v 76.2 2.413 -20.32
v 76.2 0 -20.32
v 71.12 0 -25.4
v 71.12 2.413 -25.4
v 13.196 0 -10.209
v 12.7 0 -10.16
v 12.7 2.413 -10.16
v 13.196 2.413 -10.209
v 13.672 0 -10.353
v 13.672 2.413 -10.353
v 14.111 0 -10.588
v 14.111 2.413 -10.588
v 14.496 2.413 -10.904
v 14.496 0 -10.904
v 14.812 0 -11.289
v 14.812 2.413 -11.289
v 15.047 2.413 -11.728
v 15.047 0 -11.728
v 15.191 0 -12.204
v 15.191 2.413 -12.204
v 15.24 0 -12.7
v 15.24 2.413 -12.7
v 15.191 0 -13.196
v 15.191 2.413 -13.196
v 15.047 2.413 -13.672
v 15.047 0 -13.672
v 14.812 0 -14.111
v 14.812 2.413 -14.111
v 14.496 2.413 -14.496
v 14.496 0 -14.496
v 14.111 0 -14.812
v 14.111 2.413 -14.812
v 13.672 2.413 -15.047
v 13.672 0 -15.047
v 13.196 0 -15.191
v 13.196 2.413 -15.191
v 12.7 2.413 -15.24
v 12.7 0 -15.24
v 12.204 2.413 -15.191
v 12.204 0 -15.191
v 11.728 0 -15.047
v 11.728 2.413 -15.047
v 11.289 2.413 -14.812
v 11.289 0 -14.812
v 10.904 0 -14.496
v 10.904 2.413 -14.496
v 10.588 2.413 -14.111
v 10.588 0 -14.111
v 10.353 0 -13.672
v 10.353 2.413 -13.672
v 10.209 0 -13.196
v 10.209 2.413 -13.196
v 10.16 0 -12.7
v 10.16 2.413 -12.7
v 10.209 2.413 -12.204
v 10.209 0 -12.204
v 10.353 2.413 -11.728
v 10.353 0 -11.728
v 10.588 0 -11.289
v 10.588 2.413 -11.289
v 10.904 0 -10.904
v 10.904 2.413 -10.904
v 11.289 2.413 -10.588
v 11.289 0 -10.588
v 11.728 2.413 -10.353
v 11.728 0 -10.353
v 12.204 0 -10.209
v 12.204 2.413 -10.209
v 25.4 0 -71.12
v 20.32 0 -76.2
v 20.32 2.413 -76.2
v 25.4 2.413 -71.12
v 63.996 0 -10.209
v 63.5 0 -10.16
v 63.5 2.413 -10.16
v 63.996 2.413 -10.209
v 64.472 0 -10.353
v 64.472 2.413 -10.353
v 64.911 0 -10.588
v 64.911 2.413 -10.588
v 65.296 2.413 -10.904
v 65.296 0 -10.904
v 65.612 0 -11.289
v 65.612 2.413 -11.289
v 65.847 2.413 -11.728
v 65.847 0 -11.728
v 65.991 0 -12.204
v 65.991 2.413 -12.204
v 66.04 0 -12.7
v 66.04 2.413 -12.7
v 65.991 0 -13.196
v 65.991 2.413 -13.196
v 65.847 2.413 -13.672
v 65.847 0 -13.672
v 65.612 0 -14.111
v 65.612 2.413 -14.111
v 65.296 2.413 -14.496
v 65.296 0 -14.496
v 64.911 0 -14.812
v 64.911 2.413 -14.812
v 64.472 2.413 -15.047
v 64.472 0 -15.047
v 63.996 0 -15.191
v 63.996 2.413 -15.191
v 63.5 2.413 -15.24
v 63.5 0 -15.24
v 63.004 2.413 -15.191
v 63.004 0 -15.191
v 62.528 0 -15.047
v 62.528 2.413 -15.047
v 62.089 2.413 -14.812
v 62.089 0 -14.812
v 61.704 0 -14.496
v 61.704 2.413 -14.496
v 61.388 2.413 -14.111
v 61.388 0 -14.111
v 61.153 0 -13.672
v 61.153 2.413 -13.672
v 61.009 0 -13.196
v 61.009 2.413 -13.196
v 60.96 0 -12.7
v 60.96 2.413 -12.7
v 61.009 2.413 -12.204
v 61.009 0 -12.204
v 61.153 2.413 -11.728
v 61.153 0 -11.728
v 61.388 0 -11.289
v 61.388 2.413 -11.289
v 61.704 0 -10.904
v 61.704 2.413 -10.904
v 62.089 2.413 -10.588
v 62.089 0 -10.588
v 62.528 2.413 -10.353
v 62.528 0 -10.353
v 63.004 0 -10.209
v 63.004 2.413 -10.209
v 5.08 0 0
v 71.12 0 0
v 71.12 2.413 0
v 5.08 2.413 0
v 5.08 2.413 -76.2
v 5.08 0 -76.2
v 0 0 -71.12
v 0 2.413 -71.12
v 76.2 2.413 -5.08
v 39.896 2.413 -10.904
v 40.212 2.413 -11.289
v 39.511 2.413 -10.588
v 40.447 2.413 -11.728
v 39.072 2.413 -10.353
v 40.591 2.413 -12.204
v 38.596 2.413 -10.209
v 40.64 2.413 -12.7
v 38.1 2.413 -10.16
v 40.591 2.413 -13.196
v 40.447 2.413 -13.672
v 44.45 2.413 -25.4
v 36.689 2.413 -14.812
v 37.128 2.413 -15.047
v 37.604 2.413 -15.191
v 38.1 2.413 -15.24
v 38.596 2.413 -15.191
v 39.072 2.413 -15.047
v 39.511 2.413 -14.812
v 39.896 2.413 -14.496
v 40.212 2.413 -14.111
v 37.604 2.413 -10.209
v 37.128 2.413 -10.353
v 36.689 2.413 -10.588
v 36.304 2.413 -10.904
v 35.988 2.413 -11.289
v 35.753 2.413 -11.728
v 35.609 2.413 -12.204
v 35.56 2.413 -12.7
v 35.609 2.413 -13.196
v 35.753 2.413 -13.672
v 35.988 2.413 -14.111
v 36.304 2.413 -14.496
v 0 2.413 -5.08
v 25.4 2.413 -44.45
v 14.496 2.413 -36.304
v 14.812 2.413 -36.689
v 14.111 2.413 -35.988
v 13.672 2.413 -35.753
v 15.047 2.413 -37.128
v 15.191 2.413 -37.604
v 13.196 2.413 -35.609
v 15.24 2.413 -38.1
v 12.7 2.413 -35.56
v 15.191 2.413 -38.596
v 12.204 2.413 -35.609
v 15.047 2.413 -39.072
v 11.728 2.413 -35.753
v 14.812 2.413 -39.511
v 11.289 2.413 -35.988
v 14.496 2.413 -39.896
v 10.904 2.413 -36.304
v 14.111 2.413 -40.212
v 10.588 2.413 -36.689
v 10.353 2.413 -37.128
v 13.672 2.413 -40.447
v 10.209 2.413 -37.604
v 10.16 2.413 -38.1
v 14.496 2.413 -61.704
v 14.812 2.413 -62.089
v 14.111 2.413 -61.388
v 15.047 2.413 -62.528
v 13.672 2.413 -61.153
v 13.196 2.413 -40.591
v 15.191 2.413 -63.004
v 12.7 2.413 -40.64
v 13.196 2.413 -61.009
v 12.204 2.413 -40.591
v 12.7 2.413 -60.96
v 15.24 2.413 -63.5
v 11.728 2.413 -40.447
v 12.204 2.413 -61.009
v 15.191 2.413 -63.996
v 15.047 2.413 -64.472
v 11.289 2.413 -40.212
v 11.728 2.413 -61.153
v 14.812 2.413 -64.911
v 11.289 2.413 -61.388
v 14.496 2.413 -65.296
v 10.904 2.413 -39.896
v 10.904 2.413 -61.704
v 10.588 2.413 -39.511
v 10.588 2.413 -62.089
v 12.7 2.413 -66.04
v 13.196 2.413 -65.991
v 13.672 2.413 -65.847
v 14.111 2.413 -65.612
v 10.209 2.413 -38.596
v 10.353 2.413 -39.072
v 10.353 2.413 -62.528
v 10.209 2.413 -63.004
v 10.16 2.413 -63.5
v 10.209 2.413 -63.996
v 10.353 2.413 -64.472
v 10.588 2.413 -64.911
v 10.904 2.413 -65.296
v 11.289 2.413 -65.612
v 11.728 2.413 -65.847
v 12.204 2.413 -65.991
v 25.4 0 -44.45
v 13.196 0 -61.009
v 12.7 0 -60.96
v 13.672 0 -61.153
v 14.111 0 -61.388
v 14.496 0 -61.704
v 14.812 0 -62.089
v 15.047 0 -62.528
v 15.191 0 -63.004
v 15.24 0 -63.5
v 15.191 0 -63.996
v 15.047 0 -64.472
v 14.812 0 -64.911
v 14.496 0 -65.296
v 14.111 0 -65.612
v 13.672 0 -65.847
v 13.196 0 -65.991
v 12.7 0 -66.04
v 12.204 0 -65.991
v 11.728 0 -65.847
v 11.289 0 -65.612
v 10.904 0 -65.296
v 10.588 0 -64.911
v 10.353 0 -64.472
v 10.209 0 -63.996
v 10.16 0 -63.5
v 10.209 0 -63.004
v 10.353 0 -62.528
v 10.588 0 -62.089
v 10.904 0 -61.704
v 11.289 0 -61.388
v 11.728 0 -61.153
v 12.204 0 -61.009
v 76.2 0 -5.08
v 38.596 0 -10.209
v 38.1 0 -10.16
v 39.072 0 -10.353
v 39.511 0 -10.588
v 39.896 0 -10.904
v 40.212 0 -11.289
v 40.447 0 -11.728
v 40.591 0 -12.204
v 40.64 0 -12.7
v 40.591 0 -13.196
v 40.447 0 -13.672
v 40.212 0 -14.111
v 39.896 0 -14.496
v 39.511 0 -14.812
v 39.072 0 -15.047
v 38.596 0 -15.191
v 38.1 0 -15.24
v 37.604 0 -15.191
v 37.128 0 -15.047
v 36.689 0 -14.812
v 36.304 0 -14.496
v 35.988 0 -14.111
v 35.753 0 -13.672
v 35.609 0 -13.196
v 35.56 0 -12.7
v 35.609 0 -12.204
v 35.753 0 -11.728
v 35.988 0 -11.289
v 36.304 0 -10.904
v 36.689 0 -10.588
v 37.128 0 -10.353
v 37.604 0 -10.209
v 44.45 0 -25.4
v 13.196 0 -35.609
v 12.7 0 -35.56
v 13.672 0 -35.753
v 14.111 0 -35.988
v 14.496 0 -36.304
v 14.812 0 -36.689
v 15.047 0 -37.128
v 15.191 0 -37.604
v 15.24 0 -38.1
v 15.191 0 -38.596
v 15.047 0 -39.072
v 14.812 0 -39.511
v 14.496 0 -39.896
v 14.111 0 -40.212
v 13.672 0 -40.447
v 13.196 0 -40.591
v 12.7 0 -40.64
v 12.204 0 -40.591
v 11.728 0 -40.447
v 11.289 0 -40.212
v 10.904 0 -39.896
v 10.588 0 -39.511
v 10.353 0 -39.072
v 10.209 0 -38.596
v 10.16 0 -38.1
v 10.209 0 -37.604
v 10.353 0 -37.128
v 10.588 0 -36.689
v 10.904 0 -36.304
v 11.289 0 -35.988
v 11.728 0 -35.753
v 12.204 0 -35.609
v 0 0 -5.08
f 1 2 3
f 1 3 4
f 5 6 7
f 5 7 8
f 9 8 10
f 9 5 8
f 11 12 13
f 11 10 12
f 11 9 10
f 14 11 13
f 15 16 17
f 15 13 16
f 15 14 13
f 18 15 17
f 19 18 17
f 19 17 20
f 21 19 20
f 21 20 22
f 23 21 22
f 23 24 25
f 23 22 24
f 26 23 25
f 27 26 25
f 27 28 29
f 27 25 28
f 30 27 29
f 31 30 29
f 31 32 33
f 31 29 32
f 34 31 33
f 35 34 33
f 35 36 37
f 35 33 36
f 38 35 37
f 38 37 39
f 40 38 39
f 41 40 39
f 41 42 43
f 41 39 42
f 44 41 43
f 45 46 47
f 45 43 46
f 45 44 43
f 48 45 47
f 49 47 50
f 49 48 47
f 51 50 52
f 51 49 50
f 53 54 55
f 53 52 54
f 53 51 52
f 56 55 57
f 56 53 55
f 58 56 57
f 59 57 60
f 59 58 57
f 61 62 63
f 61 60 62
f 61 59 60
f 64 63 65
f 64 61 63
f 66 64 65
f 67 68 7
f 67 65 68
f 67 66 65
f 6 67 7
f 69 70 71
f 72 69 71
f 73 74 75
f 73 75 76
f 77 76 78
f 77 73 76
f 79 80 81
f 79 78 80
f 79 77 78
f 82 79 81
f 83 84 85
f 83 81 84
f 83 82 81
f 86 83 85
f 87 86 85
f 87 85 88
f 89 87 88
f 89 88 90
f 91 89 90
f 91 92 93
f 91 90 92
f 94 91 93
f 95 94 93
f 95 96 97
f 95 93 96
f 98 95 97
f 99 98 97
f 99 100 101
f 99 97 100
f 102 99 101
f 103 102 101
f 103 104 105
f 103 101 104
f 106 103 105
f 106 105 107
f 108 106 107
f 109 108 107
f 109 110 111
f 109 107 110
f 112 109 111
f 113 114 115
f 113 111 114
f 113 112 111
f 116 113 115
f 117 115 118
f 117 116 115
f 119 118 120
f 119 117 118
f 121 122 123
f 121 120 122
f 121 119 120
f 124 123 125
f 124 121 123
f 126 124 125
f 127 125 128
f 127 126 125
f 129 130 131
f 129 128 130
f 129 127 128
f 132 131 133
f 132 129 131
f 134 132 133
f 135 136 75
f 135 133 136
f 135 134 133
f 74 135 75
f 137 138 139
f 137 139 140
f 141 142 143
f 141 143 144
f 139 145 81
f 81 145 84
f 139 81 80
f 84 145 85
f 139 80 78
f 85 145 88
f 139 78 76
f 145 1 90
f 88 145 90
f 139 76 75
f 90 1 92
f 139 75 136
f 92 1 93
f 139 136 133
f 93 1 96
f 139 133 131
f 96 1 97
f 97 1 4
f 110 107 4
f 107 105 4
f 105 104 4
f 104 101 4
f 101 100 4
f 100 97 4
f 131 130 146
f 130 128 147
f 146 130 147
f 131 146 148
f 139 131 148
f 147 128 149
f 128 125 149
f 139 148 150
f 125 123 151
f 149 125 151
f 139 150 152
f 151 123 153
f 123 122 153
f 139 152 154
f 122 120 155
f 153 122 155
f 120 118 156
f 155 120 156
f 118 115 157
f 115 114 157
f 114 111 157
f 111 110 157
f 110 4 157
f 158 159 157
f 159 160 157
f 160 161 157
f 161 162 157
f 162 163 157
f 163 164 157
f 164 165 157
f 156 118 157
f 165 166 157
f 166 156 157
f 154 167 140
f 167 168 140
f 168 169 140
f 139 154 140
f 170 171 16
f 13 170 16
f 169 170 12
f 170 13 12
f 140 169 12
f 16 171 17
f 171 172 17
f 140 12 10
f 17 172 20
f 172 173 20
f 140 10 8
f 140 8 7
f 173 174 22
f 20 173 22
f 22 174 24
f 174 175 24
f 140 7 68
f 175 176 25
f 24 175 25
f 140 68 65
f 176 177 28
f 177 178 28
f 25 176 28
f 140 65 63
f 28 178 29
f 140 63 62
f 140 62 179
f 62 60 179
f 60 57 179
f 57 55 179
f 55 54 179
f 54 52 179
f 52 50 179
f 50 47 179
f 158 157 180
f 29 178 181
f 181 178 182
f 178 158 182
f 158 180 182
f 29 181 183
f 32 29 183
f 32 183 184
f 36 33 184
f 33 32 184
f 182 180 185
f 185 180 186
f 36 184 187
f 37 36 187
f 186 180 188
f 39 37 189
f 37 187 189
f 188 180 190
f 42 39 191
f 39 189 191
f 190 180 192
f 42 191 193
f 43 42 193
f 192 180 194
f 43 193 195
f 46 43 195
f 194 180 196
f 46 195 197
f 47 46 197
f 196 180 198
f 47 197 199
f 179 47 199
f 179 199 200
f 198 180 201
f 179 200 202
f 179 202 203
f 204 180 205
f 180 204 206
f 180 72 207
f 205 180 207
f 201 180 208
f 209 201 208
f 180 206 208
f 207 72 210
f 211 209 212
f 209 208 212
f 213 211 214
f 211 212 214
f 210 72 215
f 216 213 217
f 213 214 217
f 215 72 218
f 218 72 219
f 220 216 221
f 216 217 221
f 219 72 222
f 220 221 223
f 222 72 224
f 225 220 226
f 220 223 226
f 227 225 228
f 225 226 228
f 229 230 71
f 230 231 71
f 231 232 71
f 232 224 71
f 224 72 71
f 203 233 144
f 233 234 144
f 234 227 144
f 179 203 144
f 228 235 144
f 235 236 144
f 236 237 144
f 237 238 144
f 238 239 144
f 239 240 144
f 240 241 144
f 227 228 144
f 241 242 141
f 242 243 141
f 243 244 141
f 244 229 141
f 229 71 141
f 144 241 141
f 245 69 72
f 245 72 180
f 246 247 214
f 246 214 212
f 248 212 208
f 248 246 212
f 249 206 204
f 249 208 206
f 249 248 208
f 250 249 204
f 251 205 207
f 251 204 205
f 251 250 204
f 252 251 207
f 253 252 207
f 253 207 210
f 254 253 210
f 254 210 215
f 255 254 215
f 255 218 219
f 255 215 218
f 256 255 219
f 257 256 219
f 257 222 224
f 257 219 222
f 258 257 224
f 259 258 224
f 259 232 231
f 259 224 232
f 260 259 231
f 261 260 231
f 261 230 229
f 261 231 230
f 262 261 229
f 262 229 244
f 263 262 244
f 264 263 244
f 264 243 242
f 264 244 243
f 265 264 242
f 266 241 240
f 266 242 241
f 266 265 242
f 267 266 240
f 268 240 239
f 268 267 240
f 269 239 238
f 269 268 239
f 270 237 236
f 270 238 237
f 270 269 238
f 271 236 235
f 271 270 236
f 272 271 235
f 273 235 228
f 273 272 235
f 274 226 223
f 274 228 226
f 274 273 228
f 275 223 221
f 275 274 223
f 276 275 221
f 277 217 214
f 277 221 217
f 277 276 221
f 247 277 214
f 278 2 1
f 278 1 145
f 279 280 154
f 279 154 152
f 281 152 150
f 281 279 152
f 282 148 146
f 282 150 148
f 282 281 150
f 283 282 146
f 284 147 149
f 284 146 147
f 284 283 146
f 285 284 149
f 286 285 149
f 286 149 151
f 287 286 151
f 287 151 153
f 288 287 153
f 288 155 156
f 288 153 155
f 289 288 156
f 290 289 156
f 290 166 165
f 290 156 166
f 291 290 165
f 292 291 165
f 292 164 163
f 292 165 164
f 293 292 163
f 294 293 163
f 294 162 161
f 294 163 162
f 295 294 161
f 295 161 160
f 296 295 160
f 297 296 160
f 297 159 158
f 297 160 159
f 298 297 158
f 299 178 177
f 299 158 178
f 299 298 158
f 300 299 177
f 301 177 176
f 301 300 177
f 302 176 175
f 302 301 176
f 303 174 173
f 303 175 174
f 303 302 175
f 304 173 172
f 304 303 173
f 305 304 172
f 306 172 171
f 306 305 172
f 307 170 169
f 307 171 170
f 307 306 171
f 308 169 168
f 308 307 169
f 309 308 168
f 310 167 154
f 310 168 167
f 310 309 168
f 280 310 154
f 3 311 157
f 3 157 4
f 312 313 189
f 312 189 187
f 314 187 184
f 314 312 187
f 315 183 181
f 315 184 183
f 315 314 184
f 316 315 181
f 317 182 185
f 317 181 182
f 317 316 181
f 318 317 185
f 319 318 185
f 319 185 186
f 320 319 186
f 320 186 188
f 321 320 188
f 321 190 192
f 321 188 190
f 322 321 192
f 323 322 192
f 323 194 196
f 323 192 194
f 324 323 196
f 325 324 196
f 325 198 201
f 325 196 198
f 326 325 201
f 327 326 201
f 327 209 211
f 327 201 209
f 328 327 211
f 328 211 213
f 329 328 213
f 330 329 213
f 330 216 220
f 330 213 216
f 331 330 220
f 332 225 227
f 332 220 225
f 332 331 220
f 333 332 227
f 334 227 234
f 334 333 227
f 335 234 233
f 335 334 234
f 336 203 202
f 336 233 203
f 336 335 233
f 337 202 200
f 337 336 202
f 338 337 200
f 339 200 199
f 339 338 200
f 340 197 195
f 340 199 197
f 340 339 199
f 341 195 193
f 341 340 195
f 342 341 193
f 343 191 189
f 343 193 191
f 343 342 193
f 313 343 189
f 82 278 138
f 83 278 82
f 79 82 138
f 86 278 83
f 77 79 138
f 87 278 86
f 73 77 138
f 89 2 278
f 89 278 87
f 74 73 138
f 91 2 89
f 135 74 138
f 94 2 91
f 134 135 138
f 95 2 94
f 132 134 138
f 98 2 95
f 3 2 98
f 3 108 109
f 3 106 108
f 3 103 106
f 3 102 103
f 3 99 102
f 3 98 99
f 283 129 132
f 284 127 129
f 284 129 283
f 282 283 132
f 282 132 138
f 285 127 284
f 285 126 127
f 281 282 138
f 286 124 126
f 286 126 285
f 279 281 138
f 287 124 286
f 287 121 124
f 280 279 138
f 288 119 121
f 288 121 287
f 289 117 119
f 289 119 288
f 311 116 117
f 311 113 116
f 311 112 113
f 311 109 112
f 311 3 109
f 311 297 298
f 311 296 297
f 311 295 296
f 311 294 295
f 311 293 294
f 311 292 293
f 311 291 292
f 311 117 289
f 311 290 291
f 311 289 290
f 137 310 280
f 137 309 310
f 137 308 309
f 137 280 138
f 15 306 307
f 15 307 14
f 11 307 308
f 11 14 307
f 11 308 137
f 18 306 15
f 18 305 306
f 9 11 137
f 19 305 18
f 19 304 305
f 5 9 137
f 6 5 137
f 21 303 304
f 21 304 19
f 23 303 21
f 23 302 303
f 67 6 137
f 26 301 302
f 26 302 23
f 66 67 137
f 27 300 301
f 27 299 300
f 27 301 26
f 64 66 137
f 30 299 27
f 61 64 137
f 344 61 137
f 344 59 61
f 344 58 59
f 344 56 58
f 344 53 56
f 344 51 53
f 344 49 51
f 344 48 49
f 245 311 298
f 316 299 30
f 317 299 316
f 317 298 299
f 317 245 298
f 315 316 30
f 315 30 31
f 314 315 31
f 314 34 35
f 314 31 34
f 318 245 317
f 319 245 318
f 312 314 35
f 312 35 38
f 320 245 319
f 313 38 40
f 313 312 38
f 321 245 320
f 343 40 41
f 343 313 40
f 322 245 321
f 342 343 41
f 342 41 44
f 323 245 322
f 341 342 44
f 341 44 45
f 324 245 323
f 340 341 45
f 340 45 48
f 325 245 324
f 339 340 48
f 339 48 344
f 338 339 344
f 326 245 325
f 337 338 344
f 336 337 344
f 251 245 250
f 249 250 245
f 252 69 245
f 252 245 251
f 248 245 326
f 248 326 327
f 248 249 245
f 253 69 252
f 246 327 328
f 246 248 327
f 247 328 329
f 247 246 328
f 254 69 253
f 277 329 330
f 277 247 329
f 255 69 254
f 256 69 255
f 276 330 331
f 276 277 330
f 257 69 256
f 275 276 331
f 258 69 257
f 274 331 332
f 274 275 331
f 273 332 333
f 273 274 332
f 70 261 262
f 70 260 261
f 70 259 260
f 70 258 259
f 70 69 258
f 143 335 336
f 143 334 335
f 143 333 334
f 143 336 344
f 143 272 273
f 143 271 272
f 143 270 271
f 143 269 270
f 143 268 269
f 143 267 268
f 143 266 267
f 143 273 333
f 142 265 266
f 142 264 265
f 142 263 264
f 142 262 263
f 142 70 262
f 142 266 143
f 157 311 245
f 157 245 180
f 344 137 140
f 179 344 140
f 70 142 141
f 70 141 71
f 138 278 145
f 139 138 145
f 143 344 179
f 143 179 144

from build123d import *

# Parameters (mm, degrees)
BOSS_EXTRUDE1_DEPTH     = 2.413
CHAMFER1_SIZE           = 19.05
CHAMFER2_SIZE           = 5.08
CUT_EXTRUDE1_DEPTH      = 108.790085671
CUT_EXTRUDE1_DEPTH_BACK = 108.790085671
SKETCH2_R               = 2.54


with BuildPart() as part:
    # Sketch1 → Boss-Extrude1 (new body)
    with BuildSketch(Plane(origin=(0, 0, 0), x_dir=(1, 0, 0), z_dir=(0, 1, 0))):
        Polygon((25.4, 76.2), (25.4, 25.4), (76.2, 25.4), (76.2, 0), (0, 0), (0, 76.2), align=None)
    extrude(amount=BOSS_EXTRUDE1_DEPTH)

    # Chamfer1
    chamfer1_edges = [part.edges().sort_by_distance(p)[0] for p in [
        (25.4, 1.2065, -25.4),
    ]]
    chamfer(chamfer1_edges, length=CHAMFER1_SIZE)

    # Chamfer2
    chamfer2_edges = [part.edges().sort_by_distance(p)[0] for p in [
        (0, 1.2065, -76.2),
        (25.4, 1.2065, -76.2),
        (76.2, 1.2065, -25.4),
        (76.2, 1.2065, 0),
        (0, 1.2065, 0),
    ]]
    chamfer(chamfer2_edges, length=CHAMFER2_SIZE)

    # Sketch2 → Cut-Extrude1 (cut, two sides: drawn at the far end of the back side and taken through both)
    with BuildSketch(Plane(origin=(0, 0, 0), x_dir=(1, 0, 0), z_dir=(0, 1, 0)).offset(-CUT_EXTRUDE1_DEPTH_BACK)):
        with Locations(Location((12.7, 12.7, 0), (0, 0, 270))):
            Circle(SKETCH2_R)
        with Locations(Location((12.7, 38.1, 0), (0, 0, 270))):
            Circle(SKETCH2_R)
        with Locations(Location((38.1, 12.7, 0), (0, 0, 270))):
            Circle(SKETCH2_R)
        with Locations(Location((12.7, 63.5, 0), (0, 0, 270))):
            Circle(SKETCH2_R)
        with Locations(Location((63.5, 12.7, 0), (0, 0, 270))):
            Circle(SKETCH2_R)
    extrude(amount=CUT_EXTRUDE1_DEPTH + CUT_EXTRUDE1_DEPTH_BACK, mode=Mode.SUBTRACT)


solid = part.part
